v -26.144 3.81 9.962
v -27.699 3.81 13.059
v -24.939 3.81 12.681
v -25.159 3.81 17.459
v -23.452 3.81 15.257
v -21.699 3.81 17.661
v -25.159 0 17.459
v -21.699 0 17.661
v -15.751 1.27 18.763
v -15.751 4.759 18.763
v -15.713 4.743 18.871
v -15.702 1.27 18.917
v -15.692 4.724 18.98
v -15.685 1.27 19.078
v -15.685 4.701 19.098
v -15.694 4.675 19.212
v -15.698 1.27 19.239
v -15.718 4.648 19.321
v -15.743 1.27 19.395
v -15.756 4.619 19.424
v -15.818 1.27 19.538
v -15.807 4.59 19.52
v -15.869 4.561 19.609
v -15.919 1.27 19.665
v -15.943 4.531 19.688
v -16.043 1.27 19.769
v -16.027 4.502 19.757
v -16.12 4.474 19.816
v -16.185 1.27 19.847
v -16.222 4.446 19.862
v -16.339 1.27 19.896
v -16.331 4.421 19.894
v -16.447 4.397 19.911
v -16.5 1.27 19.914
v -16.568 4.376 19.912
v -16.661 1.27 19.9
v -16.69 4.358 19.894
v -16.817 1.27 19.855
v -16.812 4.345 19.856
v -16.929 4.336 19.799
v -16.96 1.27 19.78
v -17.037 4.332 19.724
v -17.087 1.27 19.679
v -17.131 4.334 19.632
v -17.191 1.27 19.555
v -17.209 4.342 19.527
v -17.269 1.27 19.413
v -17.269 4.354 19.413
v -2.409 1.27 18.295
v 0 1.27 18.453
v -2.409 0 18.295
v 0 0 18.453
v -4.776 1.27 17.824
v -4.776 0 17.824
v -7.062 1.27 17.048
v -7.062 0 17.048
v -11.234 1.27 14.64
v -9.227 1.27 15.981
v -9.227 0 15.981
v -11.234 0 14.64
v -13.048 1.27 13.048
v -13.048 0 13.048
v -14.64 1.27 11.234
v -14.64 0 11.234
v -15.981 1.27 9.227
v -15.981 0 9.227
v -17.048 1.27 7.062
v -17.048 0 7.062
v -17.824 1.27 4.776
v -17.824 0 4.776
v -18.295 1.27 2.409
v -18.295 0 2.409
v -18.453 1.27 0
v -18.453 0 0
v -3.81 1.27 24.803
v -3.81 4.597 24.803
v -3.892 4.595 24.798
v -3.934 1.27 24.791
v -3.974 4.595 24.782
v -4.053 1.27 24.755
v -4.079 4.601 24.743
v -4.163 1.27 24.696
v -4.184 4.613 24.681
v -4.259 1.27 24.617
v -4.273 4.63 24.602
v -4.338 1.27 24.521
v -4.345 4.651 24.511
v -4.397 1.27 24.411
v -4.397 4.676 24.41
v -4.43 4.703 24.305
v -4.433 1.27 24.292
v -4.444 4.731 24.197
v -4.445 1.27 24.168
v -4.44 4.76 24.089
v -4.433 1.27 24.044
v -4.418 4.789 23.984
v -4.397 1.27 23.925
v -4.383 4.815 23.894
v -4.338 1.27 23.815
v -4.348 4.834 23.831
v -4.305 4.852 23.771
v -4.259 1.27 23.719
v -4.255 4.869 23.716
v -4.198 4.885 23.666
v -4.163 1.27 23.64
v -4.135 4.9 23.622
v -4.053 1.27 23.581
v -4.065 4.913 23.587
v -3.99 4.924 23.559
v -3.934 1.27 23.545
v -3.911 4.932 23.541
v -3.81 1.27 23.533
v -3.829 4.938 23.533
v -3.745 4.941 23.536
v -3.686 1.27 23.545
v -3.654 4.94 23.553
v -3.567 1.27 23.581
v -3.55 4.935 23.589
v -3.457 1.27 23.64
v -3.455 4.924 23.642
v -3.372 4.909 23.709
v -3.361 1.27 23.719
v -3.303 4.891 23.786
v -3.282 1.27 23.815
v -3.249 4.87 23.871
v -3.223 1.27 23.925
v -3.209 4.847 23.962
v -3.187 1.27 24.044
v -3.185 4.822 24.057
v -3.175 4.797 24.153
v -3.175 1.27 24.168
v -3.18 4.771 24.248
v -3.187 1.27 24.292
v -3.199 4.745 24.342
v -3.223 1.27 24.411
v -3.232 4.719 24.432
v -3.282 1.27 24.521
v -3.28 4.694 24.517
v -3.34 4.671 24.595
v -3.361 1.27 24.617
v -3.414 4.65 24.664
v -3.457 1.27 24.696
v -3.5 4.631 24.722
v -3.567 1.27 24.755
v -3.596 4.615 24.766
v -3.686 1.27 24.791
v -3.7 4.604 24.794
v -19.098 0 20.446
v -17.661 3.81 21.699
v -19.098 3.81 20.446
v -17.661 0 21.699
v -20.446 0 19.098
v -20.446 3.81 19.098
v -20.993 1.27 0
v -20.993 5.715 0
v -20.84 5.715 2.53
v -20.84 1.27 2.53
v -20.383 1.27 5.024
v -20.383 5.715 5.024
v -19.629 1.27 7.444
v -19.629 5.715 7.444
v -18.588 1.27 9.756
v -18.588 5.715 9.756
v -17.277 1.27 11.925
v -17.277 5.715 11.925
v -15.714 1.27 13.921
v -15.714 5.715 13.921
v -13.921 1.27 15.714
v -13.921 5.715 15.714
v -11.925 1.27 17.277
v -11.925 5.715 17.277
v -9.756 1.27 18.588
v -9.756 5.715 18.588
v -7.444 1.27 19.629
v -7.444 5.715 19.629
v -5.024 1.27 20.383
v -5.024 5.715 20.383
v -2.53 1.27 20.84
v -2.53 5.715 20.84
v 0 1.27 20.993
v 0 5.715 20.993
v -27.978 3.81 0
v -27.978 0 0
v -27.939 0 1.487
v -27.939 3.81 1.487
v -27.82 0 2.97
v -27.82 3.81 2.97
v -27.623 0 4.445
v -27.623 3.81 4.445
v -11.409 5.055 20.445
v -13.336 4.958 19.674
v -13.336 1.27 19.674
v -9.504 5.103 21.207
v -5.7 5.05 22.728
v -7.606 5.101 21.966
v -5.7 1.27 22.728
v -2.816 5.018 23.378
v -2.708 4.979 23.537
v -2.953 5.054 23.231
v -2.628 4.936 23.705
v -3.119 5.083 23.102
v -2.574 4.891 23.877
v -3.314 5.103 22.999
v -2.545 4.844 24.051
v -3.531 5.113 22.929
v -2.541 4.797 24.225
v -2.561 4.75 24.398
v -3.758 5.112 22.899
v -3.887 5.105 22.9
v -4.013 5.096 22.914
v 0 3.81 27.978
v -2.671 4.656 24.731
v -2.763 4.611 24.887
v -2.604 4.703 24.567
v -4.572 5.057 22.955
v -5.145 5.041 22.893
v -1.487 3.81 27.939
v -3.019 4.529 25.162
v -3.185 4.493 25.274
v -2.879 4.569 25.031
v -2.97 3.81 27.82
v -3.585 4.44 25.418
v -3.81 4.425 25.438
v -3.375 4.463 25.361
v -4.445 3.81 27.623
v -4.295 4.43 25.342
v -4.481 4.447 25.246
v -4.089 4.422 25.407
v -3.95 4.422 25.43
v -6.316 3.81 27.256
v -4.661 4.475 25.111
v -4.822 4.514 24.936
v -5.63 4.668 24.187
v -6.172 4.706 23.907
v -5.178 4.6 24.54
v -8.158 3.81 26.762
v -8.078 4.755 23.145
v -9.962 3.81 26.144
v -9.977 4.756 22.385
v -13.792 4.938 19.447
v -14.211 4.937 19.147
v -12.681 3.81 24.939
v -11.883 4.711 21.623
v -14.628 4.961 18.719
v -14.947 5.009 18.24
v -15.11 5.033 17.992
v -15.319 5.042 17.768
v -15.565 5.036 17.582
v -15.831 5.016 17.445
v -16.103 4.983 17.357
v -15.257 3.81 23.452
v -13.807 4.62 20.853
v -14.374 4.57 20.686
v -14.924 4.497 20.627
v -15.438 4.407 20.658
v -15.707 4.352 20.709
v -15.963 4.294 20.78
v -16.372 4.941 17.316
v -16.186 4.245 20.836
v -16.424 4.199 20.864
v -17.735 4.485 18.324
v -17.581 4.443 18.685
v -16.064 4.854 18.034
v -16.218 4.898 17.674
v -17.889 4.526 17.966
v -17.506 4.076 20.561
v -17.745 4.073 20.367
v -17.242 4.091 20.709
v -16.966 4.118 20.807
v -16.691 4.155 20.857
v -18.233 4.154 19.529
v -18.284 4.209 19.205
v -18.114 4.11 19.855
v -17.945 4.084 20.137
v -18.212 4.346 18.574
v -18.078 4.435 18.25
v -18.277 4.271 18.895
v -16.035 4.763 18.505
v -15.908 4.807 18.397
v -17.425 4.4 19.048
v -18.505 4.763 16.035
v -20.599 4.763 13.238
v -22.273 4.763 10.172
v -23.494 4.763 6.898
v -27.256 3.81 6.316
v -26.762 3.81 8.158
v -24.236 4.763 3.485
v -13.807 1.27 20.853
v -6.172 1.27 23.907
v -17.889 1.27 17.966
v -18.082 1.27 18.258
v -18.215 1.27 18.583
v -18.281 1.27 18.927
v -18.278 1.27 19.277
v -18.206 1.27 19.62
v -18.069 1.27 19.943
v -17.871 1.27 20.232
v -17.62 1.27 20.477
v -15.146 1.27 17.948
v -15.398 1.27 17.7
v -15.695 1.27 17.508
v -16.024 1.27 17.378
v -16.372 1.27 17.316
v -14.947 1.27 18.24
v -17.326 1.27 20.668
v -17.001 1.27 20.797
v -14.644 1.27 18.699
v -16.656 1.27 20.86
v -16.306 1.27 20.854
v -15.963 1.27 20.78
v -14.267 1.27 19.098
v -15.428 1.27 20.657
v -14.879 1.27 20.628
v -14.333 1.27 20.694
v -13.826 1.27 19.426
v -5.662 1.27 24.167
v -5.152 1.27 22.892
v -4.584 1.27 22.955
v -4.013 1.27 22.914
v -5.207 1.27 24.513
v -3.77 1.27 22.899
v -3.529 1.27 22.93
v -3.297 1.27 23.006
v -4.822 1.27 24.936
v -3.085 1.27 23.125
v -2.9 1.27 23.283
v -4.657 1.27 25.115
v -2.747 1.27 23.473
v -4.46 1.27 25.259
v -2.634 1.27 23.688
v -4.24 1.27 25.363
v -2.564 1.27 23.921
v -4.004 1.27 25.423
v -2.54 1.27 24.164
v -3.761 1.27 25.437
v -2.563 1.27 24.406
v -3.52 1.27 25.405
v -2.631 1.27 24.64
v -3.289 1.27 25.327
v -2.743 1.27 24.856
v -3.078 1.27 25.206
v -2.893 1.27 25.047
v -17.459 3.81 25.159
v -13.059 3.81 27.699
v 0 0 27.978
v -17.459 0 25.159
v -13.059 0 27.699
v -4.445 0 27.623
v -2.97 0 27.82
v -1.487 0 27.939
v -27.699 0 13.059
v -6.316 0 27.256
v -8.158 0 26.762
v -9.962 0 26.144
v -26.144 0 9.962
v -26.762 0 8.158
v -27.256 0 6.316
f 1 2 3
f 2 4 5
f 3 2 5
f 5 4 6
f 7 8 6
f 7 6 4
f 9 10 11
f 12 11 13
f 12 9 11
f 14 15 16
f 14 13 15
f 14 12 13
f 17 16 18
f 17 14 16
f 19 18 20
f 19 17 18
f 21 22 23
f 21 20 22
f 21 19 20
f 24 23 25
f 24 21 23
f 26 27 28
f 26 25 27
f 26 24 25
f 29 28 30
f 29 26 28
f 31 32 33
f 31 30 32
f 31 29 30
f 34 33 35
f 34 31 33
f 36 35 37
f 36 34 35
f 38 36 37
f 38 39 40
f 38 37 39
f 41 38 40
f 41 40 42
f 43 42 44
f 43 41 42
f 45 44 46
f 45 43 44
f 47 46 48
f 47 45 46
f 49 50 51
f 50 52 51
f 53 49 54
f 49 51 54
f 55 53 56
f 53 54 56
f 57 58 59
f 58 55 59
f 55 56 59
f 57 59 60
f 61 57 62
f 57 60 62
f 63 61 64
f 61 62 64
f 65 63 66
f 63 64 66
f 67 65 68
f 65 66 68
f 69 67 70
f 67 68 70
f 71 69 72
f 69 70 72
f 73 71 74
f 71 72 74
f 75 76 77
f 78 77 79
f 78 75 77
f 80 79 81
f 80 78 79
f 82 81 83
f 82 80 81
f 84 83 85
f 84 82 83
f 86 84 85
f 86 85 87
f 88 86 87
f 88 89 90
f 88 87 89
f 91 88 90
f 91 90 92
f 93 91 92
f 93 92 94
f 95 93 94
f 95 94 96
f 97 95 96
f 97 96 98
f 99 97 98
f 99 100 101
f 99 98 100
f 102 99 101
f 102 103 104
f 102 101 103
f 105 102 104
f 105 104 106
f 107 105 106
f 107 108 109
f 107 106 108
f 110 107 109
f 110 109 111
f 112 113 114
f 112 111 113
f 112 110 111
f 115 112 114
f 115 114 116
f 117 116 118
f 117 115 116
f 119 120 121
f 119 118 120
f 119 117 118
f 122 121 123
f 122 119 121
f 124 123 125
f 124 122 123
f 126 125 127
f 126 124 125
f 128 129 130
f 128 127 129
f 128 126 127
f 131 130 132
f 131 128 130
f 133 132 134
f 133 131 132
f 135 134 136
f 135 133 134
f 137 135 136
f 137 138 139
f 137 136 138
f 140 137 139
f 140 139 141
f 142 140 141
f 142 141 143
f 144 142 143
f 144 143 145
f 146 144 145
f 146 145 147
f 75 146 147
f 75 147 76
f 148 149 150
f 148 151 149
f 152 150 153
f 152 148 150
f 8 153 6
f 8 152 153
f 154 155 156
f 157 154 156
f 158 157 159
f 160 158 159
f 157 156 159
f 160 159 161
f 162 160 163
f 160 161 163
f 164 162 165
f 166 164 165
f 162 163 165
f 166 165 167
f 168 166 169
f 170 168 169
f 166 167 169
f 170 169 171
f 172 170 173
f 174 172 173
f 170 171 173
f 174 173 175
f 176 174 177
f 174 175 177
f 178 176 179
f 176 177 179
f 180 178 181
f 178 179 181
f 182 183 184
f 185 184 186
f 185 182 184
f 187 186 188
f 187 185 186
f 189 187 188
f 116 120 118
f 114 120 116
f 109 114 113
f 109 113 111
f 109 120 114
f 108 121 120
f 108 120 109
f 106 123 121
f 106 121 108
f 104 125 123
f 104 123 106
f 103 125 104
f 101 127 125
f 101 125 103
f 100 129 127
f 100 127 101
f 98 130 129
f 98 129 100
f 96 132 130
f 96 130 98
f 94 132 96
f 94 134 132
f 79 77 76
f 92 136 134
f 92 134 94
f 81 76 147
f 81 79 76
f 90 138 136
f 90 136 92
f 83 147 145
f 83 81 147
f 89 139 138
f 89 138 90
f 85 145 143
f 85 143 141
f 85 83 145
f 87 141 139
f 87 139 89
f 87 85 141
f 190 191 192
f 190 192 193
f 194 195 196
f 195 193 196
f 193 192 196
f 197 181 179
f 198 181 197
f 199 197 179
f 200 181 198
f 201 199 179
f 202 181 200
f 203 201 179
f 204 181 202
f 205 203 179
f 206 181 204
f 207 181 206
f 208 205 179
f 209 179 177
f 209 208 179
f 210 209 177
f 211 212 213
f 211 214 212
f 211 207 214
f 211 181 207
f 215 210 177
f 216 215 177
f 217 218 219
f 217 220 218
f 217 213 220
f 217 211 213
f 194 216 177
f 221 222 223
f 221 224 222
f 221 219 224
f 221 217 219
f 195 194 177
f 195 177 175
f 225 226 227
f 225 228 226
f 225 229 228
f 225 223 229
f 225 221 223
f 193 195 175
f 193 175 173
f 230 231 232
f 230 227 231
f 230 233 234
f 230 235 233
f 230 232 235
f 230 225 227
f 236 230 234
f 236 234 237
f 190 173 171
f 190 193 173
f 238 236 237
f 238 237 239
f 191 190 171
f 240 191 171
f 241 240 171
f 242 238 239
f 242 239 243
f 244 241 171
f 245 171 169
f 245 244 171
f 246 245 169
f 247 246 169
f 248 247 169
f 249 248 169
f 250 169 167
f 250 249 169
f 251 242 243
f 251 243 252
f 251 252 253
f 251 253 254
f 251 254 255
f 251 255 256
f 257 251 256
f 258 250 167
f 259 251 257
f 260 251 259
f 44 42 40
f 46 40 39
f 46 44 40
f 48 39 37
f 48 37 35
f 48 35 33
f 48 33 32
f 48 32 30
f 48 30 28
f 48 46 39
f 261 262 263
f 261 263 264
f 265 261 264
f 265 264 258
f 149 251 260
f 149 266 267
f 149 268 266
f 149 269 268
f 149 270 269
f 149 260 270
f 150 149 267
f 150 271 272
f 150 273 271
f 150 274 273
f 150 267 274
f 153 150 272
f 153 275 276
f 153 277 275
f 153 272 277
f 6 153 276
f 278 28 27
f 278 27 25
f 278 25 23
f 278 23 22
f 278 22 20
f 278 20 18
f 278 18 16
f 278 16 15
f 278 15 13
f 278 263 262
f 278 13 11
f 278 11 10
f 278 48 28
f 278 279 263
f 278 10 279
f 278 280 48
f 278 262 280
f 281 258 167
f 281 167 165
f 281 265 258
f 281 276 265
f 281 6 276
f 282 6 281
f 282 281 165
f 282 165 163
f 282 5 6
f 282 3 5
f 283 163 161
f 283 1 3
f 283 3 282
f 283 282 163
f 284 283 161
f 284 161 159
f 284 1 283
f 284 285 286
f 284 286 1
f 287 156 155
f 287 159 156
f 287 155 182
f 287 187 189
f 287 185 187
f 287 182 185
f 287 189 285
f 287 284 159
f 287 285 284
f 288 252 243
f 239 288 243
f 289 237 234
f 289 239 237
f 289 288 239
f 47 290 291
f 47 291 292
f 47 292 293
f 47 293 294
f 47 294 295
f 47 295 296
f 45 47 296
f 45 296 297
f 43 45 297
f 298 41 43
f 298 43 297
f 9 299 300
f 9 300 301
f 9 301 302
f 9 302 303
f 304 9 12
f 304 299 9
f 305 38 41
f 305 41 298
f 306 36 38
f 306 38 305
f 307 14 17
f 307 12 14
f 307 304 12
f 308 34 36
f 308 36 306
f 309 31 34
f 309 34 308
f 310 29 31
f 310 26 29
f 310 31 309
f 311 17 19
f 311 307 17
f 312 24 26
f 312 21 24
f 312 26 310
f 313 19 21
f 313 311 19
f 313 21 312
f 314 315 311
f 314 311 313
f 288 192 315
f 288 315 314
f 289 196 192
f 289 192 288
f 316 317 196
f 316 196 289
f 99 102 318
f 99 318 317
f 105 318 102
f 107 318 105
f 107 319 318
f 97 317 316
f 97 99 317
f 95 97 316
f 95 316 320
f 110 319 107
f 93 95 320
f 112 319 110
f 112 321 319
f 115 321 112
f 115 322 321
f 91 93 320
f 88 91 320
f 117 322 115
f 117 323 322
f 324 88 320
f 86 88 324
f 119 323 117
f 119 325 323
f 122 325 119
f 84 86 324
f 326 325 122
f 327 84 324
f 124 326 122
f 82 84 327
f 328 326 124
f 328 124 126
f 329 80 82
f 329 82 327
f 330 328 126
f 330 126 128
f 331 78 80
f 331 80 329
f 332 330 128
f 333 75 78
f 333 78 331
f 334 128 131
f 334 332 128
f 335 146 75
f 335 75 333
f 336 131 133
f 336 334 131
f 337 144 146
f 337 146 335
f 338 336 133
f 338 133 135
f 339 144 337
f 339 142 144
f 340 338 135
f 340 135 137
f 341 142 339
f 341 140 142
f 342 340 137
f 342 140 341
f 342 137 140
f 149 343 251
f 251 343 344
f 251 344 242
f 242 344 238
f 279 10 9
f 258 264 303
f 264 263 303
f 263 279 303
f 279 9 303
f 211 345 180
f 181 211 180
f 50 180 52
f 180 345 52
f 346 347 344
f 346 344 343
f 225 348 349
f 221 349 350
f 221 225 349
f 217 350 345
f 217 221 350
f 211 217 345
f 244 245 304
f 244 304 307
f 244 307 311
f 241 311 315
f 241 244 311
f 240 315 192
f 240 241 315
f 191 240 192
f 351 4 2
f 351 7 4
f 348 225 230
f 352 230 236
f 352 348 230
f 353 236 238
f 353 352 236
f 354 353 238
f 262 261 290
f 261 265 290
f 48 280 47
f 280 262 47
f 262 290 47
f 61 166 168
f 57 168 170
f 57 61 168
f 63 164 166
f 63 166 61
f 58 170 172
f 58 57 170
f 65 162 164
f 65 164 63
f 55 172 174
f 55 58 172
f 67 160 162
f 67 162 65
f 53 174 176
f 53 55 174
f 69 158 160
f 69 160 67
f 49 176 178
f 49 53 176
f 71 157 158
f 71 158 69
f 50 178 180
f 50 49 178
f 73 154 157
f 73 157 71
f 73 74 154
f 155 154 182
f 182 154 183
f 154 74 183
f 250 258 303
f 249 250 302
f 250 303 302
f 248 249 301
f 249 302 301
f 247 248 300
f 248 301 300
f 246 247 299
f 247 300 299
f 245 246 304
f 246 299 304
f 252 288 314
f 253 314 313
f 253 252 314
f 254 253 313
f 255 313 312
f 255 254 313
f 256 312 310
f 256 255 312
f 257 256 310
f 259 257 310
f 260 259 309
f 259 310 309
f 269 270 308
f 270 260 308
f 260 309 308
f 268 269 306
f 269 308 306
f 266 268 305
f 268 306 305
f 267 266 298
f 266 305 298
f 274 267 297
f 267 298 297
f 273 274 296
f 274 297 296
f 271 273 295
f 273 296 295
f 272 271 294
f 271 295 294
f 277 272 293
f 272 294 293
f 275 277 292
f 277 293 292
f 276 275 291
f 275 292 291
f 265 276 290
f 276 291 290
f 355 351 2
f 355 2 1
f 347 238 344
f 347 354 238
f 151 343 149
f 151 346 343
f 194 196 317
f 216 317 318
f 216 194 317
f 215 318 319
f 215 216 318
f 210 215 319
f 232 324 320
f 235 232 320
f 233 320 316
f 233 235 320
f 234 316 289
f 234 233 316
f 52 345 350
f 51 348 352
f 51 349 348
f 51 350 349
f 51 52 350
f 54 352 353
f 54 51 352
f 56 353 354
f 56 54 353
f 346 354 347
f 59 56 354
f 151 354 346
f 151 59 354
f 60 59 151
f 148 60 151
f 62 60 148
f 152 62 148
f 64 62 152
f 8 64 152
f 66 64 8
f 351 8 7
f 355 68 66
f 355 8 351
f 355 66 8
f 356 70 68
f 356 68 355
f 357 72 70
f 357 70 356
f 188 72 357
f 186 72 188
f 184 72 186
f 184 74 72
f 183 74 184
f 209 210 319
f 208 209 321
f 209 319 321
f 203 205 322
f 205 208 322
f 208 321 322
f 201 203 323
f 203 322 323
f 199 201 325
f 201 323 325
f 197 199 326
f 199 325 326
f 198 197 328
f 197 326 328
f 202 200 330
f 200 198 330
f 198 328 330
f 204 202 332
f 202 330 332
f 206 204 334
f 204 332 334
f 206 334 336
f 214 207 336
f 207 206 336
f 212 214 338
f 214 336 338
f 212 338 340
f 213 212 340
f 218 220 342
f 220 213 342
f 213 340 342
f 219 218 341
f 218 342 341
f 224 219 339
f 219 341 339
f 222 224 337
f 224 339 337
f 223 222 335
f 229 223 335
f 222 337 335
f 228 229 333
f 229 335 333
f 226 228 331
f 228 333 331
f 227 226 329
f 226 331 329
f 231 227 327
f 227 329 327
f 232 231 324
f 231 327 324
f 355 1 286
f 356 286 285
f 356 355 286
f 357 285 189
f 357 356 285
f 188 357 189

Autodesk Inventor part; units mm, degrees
ref_plane "YZ Plane" through (0, 0, 0) normal (1, 0, 0) x (0, 1, 0)
ref_plane "XZ Plane" through (0, 0, 0) normal (0, 1, 0) x (-1, 0, 0)
sketch "Sketch1" plane through (0, 0, 0) normal (0, 0, 1) x (1, 0, 0)
  line L0 (0, 0) -> (0, 8.6646) construction
  line L1 (20.9931, 1.27) -> (20.9931, 5.715)
  line L2 (20.9931, 5.715) -> (27.9781, 3.81)
  line L3 (27.9781, 3.81) -> (27.9781, 0)
  line L4 (27.9781, 0) -> (20.9931, 0)
  line L5 (20.9931, 1.27) -> (18.4531, 1.27)
  line L6 (18.4531, 1.27) -> (18.4531, 0)
  line L7 (18.4531, 0) -> (20.9931, 0)
  dimension "d0" = 20.9931
  dimension "d1" = 4.445
  dimension "d2" = 1.27
  dimension "d3" = 2.54
  dimension "d4" = 3.81
  dimension "d5" = 6.985
revolve "Revolution1" add sketch "Sketch1" angle 360 about axis through (0, 0, 0) along (0, 1, 0)
ref_plane "Work Plane1" through (0, 3.81, 0) normal (0, 1, 0) x (1, 0, 0)
sketch "Sketch2" plane through (0, 0, 0) normal (0, -1, 0) x (1, 0, 0)
  line L0 (0, 0) -> (-45.8206, 0) construction
  circle A0 centre (0, 0) radius 27.9781 projected
  line L1 (-27.6227, 4.445) -> (-30.5181, 2.54)
  line L2 (-30.5181, 2.54) -> (-30.5181, -2.54)
  line L3 (-30.5181, -2.54) -> (-27.6227, -4.445)
  dimension "d7" = 2.54
  dimension "d8" = 8.89
  dimension "d9" = 5.08
extrude "Extrusion1" add sketch "Sketch2" against normal up to surface (3.81 mm away) contours A0 L3 L2 L1
pattern_circular "Circular Pattern1" count 12 over 360 about axis through (0, 1.905, 0) along (0, -1, 0) of "Extrusion1"
sketch "Sketch4" plane through (0, 1.27, 0) normal (0, 1, 0) x (1, 0, 0)
  circle A0 centre (0, 0) radius 20.9931 projected
  arc A1 (-26.1445, 9.9619) -> (-27.6227, 4.445) centre (0, 0) ccw projected
  arc A2 (-27.6227, 4.445) -> (-27.6227, -4.445) centre (0, 0) ccw projected
  arc A3 (-27.6227, -4.445) -> (-26.1445, -9.9619) centre (0, 0) ccw projected
  arc A4 (-26.1445, -9.9619) -> (-21.6995, -17.6609) centre (0, 0) ccw projected
  arc A5 (-21.6995, -17.6609) -> (-17.6609, -21.6995) centre (0, 0) ccw projected
  arc A6 (-17.6609, -21.6995) -> (-9.9619, -26.1445) centre (0, 0) ccw projected
  arc A7 (-9.9619, -26.1445) -> (-4.445, -27.6227) centre (0, 0) ccw projected
  arc A8 (-4.445, -27.6227) -> (4.445, -27.6227) centre (0, 0) ccw projected
  arc A9 (4.445, -27.6227) -> (9.9619, -26.1445) centre (0, 0) ccw projected
  arc A10 (9.9619, -26.1445) -> (17.6609, -21.6995) centre (0, 0) ccw projected
  arc A11 (17.6609, -21.6995) -> (21.6995, -17.6609) centre (0, 0) ccw projected
  arc A12 (21.6995, -17.6609) -> (26.1445, -9.9619) centre (0, 0) ccw projected
  arc A13 (26.1445, -9.9619) -> (27.6227, -4.445) centre (0, 0) ccw projected
  arc A14 (27.6227, -4.445) -> (27.6227, 4.445) centre (0, 0) ccw projected
  arc A15 (27.6227, 4.445) -> (26.1445, 9.9619) centre (0, 0) ccw projected
  arc A16 (26.1445, 9.9619) -> (21.6995, 17.6609) centre (0, 0) ccw projected
  arc A17 (21.6995, 17.6609) -> (17.6609, 21.6995) centre (0, 0) ccw projected
  arc A18 (17.6609, 21.6995) -> (9.9619, 26.1445) centre (0, 0) ccw projected
  arc A19 (9.9619, 26.1445) -> (4.445, 27.6227) centre (0, 0) ccw projected
  arc A20 (4.445, 27.6227) -> (-4.445, 27.6227) centre (0, 0) ccw projected
  arc A21 (-4.445, 27.6227) -> (-9.9619, 26.1445) centre (0, 0) ccw projected
  arc A22 (-9.9619, 26.1445) -> (-17.6609, 21.6995) centre (0, 0) ccw projected
  arc A23 (-17.6609, 21.6995) -> (-21.6995, 17.6609) centre (0, 0) ccw projected
  arc A24 (-21.6995, 17.6609) -> (-26.1445, 9.9619) centre (0, 0) ccw projected
  circle A25 centre (0, 0) radius 18.4531 projected
  circle A26 centre (0, 0) radius 20.9931 projected
  circle A27 centre (24.1681, -3.81) radius 1.27
  circle A28 centre (24.1681, -3.81) radius 0.635
  line L0 (30.5181, 2.54) -> (30.5181, -2.54) projected
  arc A29 (17.9659, -17.8891) -> (17.3155, -16.3716) centre (19.0881, -16.51) ccw
  line L1 (19.0881, -16.51) -> (15.2571, -18.1519) construction
  line L2 (18.7629, -15.7512) -> (17.3155, -16.3716)
  line L3 (17.9659, -17.8891) -> (19.4133, -17.2688)
  arc A30 (19.4133, -17.2688) -> (18.7629, -15.7512) centre (19.0881, -16.51) ccw
  line L4 (19.0881, -16.51) -> (24.1681, -3.81) construction
  line L5 (19.1153, -14.7322) -> (23.17, -4.5954)
  line L6 (20.2945, -15.2039) -> (24.3492, -5.067)
  point P0 (17.1726, -17.3309)
  dimension "d19" = 2.54
  dimension "d20" = 0.635
  dimension "d22" = 3.81
  dimension "d23" = 6.35
  dimension "d24" = 3.556
  dimension "d25" = 135
  dimension "d26" = 1.27
  dimension "d27" = 0.635
  dimension "d28" = 12.7
  dimension "d29" = 5.08
  dimension "d30" = 1.651
extrude "Extrusion3" cut sketch "Sketch4" along normal through all contours A27 | A27 L6 A29 L5 | A29 L3 A30 L2
fillet "Fillet1" radius 3.175 4 edges at (19.1153, 3.0642, 14.7322) (20.2945, 2.8973, 15.2039) (23.17, 3.1341, 4.5954) (24.3492, 2.9637, 5.067)
pattern_circular "Circular Pattern2" count 3 over 90 about axis through (0, 3.4925, 0) along (0, -1, 0) of "Extrusion3", "Fillet1"
mirror "Mirror1" about plane through (0, 0, 0) normal (0, 0, 1) of "Extrusion3", "Fillet1", "Circular Pattern2"
sketch "Sketch5" plane through (0, 1.27, 0) normal (0, 1, 0) x (1, 0, 0)
  line L0 (0, 0) -> (-35.8156, 0)
  line L1 (-35.8156, 0) -> (-35.8156, -45.2748)
  line L2 (-35.8156, -45.2748) -> (0, -45.2748)
  line L3 (0, -45.2748) -> (0, 0)
extrude "Extrusion4" cut sketch "Sketch5" along normal through all both and the other way through all keep common part
sketch "Sketch6" plane through (-2.54, 0, 30.5181) normal (0, -1, 0) x (1, 0, 0)
  line L0 (2.54, -9.525) -> (2.54, -2.54) projected
  arc A0 (2.54, -9.525) -> (-18.4531, -30.5181) centre (2.54, -30.5181) ccw projected
  line L1 (-25.4381, -30.5181) -> (-18.4531, -30.5181) projected
  arc A1 (-25.0827, -26.0731) -> (-25.4381, -30.5181) centre (2.54, -30.5181) ccw projected
  arc A2 (-23.6045, -20.5562) -> (-25.0827, -26.0731) centre (2.54, -30.5181) ccw projected
  arc A3 (-19.1595, -12.8572) -> (-23.6045, -20.5562) centre (2.54, -30.5181) ccw projected
  arc A4 (-15.1209, -8.8186) -> (-19.1595, -12.8572) centre (2.54, -30.5181) ccw projected
  arc A5 (-7.4219, -4.3736) -> (-15.1209, -8.8186) centre (2.54, -30.5181) ccw projected
  arc A6 (-1.905, -2.8954) -> (-7.4219, -4.3736) centre (2.54, -30.5181) ccw projected
  arc A7 (2.54, -2.54) -> (-1.905, -2.8954) centre (2.54, -30.5181) ccw projected
  line L2 (-3.6316, -6.6107) -> (-11.2674, -9.665) projected
  line L3 (-15.3491, -12.5522) -> (-14.7288, -11.1048) projected
  line L4 (-13.2112, -11.7552) -> (-13.8316, -13.2026) projected
  line L5 (-10.7957, -10.8442) -> (-3.1599, -7.7899) projected
  arc A8 (-23.6045, -20.5562) -> (-25.0827, -26.0731) centre (2.54, -30.5181) ccw projected
  line L6 (-25.0827, -26.0731) -> (-30.8234, -26.6683)
  line L7 (-30.8234, -26.6683) -> (-31.3133, -31.1273)
  line L8 (-31.3133, -31.1273) -> (-25.4381, -30.5181)
  line L9 (2.54, -2.54) -> (2.54, 0) projected
  arc A9 (2.54, -2.54) -> (-1.905, -2.8954) centre (2.54, -30.5181) ccw projected
  arc A10 (2.54, -2.54) -> (-1.905, -2.8954) centre (2.54, -30.5181) ccw
  line L10 (-1.905, -2.8954) -> (-3.1599, 4.5152)
  line L11 (-3.1599, 4.5152) -> (4.4262, 3.6816)
  line L12 (4.4262, 3.6816) -> (2.54, -2.54)
  point P0 (-2.2816, -5.5822)
  point P1 (-13.4231, -9.7382)
  point P2 (-12.4072, -12.2779)
  point P3 (-1.4731, -7.6037)
extrude "Extrusion5" cut sketch "Sketch6" along normal through all both and the other way through all contours A7 L10 L11 L12 | L8 L7 L6 A1
sketch "Sketch7" plane through (-20.9931, 1.27, 0) normal (0, 1, 0) x (1, 0, 0)
  point P0 (20.9931, 0)
equation "\"d27\" = 0.5 * d26"
properties part number "Mentor-Mechanical ring"
